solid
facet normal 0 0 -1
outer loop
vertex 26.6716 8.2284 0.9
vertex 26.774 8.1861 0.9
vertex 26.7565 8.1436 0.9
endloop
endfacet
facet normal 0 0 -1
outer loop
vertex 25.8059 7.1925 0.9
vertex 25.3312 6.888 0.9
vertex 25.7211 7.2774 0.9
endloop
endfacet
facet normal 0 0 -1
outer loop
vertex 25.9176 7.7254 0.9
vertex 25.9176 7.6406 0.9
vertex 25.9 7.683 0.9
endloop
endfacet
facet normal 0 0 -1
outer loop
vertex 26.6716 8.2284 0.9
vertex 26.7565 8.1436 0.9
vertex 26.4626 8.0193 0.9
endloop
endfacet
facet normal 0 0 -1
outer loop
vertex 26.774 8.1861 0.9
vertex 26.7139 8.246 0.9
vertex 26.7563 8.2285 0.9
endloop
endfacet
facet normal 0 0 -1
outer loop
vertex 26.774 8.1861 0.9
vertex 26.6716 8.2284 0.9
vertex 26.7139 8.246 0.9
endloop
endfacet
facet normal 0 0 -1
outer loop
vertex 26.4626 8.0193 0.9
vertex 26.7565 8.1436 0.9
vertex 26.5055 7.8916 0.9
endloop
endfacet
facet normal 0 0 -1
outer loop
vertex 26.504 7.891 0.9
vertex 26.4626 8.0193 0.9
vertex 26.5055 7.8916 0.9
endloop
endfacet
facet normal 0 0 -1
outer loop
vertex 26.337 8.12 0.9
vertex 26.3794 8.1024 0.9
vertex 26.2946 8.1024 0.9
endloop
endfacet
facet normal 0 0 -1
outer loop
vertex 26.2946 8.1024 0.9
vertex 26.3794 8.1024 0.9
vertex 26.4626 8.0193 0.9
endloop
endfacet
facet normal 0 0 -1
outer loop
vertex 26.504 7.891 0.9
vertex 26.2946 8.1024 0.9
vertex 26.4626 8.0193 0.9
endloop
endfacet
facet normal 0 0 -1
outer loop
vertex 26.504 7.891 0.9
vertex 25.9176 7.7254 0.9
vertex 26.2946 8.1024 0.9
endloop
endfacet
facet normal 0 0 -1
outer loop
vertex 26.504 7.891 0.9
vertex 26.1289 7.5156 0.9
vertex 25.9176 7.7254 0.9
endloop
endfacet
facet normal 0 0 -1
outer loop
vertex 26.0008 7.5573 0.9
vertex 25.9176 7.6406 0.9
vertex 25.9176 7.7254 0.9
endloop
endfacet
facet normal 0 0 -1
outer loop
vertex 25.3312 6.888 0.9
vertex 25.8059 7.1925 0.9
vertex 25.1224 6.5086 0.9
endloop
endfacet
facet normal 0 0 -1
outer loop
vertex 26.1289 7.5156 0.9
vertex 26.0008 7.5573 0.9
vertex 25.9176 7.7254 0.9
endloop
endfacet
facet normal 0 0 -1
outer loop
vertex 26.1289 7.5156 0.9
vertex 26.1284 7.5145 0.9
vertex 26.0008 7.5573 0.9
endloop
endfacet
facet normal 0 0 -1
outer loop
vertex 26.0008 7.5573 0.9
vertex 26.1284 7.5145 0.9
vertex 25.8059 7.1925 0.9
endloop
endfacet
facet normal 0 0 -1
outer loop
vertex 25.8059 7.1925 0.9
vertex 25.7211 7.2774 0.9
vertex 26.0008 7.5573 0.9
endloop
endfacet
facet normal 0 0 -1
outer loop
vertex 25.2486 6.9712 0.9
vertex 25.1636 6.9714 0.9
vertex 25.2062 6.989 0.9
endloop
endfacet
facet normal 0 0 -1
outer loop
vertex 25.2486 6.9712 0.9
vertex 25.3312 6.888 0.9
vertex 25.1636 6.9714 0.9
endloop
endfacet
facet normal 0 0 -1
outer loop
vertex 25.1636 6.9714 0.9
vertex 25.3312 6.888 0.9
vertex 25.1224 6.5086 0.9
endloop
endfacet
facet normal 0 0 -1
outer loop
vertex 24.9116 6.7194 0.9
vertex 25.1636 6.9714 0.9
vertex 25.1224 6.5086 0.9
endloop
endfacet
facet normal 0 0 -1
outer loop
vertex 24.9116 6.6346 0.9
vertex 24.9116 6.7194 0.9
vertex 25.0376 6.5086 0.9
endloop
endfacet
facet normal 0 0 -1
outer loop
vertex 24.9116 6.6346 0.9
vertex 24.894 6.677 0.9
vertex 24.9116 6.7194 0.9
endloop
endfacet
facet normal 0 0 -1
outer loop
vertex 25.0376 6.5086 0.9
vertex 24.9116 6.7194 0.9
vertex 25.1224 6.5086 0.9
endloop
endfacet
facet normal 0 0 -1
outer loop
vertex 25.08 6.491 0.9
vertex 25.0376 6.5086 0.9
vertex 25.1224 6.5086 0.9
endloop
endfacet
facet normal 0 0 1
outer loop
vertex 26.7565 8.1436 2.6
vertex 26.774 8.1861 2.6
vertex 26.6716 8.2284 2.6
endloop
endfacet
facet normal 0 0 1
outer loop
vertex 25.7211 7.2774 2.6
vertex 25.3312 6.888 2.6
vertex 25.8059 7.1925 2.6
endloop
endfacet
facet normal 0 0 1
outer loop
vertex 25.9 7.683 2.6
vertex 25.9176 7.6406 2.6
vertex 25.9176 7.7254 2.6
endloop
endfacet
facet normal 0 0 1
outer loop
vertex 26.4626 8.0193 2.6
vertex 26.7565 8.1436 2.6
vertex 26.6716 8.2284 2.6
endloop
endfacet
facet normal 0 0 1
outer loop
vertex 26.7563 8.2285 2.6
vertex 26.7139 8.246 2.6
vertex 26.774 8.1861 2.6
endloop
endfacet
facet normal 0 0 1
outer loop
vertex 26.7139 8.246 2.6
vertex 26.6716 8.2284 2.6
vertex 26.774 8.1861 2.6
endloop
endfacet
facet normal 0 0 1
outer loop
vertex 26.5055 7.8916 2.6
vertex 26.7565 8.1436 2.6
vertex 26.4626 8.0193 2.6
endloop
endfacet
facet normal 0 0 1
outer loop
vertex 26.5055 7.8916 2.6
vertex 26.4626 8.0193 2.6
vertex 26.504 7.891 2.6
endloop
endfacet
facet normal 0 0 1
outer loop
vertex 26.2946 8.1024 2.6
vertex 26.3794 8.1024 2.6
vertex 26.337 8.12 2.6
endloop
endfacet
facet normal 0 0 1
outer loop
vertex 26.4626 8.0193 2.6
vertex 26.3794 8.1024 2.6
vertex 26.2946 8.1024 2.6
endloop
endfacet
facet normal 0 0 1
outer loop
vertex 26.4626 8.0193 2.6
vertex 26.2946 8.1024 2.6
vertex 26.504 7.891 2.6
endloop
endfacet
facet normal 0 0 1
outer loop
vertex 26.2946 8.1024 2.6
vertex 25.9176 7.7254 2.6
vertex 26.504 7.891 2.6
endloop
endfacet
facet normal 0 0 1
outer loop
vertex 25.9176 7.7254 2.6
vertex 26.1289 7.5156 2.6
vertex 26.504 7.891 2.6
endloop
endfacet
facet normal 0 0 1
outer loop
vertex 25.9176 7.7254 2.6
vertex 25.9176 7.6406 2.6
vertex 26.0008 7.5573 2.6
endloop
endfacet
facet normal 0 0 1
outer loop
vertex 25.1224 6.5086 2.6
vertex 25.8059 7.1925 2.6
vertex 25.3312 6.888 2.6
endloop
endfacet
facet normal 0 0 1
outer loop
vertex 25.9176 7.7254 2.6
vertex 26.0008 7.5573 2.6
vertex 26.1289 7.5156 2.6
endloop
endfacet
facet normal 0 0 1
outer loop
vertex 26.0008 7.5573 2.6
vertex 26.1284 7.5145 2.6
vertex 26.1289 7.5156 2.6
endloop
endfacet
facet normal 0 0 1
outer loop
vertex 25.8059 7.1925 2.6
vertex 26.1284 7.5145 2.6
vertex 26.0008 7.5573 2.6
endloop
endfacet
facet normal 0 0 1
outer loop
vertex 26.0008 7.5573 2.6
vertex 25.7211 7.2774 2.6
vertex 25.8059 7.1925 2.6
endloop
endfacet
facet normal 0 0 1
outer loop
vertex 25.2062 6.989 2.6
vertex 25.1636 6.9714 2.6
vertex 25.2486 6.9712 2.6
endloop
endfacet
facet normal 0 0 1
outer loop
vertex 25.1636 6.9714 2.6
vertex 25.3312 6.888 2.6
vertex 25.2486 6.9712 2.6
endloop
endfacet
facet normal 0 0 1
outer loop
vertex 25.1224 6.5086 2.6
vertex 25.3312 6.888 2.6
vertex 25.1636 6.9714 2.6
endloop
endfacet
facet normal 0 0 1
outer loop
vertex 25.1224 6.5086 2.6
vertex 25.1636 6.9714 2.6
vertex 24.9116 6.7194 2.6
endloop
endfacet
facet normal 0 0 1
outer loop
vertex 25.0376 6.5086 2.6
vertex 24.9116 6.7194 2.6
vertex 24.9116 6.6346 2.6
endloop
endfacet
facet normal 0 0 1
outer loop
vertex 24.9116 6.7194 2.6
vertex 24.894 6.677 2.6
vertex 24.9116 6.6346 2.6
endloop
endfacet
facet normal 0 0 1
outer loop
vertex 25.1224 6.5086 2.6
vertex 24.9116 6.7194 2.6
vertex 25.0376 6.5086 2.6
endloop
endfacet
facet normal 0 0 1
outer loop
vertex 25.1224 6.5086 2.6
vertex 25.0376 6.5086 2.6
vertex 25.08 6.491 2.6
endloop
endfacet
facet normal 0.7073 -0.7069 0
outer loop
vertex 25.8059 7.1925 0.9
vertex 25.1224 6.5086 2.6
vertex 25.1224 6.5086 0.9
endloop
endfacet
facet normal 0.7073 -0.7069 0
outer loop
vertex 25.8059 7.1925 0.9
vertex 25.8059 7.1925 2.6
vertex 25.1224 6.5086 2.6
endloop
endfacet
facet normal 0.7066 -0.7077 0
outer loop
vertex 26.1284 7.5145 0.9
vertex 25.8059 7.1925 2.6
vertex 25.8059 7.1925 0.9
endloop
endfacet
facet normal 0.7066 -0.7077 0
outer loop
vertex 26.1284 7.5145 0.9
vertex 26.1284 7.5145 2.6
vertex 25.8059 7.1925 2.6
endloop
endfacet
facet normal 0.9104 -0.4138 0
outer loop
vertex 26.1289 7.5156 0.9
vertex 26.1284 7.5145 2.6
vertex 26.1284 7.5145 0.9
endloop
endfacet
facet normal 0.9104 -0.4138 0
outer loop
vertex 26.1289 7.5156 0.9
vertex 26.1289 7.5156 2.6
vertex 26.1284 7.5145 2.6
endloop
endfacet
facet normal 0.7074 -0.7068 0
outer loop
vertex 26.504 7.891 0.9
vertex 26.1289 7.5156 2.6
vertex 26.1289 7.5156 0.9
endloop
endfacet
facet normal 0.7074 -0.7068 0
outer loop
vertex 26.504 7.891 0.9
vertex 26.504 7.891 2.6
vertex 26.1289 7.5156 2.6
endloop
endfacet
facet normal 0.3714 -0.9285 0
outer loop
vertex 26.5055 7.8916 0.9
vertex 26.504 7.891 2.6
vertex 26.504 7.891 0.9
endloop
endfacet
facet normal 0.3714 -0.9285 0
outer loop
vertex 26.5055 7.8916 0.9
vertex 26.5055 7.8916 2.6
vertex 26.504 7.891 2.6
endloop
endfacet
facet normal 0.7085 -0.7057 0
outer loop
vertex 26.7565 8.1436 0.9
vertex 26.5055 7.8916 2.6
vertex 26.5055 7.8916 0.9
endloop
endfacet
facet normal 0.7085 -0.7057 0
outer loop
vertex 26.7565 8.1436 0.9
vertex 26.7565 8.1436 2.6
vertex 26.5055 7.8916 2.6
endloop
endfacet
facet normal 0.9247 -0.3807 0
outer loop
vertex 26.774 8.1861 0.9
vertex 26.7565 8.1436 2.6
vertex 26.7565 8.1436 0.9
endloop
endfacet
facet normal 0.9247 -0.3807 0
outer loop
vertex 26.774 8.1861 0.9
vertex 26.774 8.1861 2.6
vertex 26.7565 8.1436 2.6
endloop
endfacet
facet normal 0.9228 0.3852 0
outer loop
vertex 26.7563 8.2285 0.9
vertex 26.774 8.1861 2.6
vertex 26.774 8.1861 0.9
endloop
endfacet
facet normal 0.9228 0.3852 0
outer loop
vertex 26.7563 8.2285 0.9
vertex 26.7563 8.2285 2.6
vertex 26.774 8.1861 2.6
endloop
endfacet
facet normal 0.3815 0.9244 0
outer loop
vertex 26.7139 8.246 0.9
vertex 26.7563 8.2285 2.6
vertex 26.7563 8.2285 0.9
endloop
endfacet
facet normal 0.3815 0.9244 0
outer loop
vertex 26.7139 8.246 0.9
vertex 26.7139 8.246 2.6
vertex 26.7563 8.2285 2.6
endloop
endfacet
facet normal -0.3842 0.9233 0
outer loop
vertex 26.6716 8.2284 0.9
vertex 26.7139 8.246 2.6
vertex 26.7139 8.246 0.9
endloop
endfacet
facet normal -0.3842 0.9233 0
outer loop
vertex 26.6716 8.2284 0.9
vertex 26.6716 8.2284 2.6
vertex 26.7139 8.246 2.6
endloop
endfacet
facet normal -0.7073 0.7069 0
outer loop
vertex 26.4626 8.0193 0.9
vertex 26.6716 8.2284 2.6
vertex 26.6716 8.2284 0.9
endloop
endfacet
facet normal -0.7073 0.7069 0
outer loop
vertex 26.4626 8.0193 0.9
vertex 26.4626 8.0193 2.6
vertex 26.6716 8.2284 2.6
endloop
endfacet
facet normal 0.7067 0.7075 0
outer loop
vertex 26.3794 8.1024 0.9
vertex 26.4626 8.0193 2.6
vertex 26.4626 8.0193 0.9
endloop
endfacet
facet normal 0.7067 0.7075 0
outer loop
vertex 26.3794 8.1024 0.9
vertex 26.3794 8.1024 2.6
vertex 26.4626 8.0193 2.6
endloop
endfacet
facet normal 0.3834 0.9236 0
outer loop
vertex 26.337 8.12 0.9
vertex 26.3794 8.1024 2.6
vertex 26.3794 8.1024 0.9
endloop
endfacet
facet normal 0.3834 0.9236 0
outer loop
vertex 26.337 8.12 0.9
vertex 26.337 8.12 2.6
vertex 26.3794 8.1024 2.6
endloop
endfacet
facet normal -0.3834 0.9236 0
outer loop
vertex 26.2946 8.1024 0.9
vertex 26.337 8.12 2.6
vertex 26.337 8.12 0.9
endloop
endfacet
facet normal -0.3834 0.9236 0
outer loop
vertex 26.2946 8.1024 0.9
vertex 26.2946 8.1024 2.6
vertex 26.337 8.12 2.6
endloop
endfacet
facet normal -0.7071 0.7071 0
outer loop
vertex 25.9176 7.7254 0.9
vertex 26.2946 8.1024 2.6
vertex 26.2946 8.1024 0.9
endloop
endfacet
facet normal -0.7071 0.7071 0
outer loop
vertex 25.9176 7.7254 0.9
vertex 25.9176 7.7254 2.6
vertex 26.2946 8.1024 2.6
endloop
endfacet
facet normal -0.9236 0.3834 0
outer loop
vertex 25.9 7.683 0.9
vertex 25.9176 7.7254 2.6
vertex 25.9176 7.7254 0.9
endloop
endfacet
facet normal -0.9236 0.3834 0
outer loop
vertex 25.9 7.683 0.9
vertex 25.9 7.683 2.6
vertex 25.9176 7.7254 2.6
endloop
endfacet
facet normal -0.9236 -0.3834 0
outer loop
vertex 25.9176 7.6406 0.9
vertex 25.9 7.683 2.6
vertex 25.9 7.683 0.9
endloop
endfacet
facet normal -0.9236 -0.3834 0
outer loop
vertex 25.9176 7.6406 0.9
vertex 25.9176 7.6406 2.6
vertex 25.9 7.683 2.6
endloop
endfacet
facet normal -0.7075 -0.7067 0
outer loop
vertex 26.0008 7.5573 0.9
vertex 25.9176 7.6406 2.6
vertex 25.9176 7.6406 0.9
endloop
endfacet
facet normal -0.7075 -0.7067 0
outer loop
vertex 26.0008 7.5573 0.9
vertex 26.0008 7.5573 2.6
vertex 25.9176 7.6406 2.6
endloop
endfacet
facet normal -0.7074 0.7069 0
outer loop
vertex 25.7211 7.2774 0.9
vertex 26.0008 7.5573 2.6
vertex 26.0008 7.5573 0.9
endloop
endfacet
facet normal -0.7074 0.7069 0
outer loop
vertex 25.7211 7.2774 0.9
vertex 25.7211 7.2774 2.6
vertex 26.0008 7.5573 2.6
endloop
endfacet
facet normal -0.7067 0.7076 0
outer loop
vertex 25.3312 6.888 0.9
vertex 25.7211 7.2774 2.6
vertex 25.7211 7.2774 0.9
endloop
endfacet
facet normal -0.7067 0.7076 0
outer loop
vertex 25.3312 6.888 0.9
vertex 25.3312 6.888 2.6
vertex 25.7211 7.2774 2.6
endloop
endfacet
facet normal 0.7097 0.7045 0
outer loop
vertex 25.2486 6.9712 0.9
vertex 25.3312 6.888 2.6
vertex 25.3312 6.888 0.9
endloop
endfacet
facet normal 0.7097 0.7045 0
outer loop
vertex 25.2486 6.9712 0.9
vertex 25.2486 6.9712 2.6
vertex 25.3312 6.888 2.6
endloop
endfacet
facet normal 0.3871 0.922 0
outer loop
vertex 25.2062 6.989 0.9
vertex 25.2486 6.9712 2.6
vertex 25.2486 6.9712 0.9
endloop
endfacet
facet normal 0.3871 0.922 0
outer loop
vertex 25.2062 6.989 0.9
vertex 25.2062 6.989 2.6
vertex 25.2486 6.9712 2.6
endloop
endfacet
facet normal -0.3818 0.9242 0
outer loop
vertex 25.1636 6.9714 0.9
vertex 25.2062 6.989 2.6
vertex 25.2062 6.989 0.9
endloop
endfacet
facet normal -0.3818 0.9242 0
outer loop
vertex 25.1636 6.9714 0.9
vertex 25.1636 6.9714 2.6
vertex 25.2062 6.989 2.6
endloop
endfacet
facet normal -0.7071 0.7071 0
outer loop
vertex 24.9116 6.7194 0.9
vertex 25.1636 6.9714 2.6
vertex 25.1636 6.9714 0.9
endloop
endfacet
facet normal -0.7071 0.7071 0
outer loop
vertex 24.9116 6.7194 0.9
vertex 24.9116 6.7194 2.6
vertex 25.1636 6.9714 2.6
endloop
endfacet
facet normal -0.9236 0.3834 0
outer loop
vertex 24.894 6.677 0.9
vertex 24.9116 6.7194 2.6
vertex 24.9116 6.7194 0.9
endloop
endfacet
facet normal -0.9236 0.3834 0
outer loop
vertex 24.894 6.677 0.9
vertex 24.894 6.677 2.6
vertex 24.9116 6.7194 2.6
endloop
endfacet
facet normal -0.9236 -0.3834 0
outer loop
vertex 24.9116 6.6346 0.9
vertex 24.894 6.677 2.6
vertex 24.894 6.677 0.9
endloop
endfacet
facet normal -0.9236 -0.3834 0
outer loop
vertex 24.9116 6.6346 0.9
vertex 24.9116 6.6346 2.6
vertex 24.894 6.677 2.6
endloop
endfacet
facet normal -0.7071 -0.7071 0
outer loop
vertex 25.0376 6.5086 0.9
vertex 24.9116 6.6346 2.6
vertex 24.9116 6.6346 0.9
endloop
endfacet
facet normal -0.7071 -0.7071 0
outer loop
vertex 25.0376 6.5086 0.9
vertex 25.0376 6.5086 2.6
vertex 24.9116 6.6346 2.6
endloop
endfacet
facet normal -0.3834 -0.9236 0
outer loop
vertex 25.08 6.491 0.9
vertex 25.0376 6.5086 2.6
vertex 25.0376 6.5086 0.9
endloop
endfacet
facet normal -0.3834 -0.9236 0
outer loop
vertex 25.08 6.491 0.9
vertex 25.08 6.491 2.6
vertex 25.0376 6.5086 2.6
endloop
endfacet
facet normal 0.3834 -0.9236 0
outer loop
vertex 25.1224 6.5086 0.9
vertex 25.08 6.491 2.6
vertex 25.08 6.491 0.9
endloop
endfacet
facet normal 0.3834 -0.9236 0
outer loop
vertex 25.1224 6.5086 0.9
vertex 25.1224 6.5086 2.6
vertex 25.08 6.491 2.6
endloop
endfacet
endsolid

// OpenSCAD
$fn = 24;
translate([0, -2.500, 0.900])
  linear_extrude(height=1.700) {
offset(r=0.06, $fn=8) {
    polygon(points=[[26.714,10.686],[26.463,10.434],[26.337,10.560],[25.960,10.183],[26.086,10.057],[25.331,9.303],[25.206,9.429],[24.954,9.177],[25.080,9.051]], paths=[[0,1,2,3,4,5,6,7,8]]);
}
}
